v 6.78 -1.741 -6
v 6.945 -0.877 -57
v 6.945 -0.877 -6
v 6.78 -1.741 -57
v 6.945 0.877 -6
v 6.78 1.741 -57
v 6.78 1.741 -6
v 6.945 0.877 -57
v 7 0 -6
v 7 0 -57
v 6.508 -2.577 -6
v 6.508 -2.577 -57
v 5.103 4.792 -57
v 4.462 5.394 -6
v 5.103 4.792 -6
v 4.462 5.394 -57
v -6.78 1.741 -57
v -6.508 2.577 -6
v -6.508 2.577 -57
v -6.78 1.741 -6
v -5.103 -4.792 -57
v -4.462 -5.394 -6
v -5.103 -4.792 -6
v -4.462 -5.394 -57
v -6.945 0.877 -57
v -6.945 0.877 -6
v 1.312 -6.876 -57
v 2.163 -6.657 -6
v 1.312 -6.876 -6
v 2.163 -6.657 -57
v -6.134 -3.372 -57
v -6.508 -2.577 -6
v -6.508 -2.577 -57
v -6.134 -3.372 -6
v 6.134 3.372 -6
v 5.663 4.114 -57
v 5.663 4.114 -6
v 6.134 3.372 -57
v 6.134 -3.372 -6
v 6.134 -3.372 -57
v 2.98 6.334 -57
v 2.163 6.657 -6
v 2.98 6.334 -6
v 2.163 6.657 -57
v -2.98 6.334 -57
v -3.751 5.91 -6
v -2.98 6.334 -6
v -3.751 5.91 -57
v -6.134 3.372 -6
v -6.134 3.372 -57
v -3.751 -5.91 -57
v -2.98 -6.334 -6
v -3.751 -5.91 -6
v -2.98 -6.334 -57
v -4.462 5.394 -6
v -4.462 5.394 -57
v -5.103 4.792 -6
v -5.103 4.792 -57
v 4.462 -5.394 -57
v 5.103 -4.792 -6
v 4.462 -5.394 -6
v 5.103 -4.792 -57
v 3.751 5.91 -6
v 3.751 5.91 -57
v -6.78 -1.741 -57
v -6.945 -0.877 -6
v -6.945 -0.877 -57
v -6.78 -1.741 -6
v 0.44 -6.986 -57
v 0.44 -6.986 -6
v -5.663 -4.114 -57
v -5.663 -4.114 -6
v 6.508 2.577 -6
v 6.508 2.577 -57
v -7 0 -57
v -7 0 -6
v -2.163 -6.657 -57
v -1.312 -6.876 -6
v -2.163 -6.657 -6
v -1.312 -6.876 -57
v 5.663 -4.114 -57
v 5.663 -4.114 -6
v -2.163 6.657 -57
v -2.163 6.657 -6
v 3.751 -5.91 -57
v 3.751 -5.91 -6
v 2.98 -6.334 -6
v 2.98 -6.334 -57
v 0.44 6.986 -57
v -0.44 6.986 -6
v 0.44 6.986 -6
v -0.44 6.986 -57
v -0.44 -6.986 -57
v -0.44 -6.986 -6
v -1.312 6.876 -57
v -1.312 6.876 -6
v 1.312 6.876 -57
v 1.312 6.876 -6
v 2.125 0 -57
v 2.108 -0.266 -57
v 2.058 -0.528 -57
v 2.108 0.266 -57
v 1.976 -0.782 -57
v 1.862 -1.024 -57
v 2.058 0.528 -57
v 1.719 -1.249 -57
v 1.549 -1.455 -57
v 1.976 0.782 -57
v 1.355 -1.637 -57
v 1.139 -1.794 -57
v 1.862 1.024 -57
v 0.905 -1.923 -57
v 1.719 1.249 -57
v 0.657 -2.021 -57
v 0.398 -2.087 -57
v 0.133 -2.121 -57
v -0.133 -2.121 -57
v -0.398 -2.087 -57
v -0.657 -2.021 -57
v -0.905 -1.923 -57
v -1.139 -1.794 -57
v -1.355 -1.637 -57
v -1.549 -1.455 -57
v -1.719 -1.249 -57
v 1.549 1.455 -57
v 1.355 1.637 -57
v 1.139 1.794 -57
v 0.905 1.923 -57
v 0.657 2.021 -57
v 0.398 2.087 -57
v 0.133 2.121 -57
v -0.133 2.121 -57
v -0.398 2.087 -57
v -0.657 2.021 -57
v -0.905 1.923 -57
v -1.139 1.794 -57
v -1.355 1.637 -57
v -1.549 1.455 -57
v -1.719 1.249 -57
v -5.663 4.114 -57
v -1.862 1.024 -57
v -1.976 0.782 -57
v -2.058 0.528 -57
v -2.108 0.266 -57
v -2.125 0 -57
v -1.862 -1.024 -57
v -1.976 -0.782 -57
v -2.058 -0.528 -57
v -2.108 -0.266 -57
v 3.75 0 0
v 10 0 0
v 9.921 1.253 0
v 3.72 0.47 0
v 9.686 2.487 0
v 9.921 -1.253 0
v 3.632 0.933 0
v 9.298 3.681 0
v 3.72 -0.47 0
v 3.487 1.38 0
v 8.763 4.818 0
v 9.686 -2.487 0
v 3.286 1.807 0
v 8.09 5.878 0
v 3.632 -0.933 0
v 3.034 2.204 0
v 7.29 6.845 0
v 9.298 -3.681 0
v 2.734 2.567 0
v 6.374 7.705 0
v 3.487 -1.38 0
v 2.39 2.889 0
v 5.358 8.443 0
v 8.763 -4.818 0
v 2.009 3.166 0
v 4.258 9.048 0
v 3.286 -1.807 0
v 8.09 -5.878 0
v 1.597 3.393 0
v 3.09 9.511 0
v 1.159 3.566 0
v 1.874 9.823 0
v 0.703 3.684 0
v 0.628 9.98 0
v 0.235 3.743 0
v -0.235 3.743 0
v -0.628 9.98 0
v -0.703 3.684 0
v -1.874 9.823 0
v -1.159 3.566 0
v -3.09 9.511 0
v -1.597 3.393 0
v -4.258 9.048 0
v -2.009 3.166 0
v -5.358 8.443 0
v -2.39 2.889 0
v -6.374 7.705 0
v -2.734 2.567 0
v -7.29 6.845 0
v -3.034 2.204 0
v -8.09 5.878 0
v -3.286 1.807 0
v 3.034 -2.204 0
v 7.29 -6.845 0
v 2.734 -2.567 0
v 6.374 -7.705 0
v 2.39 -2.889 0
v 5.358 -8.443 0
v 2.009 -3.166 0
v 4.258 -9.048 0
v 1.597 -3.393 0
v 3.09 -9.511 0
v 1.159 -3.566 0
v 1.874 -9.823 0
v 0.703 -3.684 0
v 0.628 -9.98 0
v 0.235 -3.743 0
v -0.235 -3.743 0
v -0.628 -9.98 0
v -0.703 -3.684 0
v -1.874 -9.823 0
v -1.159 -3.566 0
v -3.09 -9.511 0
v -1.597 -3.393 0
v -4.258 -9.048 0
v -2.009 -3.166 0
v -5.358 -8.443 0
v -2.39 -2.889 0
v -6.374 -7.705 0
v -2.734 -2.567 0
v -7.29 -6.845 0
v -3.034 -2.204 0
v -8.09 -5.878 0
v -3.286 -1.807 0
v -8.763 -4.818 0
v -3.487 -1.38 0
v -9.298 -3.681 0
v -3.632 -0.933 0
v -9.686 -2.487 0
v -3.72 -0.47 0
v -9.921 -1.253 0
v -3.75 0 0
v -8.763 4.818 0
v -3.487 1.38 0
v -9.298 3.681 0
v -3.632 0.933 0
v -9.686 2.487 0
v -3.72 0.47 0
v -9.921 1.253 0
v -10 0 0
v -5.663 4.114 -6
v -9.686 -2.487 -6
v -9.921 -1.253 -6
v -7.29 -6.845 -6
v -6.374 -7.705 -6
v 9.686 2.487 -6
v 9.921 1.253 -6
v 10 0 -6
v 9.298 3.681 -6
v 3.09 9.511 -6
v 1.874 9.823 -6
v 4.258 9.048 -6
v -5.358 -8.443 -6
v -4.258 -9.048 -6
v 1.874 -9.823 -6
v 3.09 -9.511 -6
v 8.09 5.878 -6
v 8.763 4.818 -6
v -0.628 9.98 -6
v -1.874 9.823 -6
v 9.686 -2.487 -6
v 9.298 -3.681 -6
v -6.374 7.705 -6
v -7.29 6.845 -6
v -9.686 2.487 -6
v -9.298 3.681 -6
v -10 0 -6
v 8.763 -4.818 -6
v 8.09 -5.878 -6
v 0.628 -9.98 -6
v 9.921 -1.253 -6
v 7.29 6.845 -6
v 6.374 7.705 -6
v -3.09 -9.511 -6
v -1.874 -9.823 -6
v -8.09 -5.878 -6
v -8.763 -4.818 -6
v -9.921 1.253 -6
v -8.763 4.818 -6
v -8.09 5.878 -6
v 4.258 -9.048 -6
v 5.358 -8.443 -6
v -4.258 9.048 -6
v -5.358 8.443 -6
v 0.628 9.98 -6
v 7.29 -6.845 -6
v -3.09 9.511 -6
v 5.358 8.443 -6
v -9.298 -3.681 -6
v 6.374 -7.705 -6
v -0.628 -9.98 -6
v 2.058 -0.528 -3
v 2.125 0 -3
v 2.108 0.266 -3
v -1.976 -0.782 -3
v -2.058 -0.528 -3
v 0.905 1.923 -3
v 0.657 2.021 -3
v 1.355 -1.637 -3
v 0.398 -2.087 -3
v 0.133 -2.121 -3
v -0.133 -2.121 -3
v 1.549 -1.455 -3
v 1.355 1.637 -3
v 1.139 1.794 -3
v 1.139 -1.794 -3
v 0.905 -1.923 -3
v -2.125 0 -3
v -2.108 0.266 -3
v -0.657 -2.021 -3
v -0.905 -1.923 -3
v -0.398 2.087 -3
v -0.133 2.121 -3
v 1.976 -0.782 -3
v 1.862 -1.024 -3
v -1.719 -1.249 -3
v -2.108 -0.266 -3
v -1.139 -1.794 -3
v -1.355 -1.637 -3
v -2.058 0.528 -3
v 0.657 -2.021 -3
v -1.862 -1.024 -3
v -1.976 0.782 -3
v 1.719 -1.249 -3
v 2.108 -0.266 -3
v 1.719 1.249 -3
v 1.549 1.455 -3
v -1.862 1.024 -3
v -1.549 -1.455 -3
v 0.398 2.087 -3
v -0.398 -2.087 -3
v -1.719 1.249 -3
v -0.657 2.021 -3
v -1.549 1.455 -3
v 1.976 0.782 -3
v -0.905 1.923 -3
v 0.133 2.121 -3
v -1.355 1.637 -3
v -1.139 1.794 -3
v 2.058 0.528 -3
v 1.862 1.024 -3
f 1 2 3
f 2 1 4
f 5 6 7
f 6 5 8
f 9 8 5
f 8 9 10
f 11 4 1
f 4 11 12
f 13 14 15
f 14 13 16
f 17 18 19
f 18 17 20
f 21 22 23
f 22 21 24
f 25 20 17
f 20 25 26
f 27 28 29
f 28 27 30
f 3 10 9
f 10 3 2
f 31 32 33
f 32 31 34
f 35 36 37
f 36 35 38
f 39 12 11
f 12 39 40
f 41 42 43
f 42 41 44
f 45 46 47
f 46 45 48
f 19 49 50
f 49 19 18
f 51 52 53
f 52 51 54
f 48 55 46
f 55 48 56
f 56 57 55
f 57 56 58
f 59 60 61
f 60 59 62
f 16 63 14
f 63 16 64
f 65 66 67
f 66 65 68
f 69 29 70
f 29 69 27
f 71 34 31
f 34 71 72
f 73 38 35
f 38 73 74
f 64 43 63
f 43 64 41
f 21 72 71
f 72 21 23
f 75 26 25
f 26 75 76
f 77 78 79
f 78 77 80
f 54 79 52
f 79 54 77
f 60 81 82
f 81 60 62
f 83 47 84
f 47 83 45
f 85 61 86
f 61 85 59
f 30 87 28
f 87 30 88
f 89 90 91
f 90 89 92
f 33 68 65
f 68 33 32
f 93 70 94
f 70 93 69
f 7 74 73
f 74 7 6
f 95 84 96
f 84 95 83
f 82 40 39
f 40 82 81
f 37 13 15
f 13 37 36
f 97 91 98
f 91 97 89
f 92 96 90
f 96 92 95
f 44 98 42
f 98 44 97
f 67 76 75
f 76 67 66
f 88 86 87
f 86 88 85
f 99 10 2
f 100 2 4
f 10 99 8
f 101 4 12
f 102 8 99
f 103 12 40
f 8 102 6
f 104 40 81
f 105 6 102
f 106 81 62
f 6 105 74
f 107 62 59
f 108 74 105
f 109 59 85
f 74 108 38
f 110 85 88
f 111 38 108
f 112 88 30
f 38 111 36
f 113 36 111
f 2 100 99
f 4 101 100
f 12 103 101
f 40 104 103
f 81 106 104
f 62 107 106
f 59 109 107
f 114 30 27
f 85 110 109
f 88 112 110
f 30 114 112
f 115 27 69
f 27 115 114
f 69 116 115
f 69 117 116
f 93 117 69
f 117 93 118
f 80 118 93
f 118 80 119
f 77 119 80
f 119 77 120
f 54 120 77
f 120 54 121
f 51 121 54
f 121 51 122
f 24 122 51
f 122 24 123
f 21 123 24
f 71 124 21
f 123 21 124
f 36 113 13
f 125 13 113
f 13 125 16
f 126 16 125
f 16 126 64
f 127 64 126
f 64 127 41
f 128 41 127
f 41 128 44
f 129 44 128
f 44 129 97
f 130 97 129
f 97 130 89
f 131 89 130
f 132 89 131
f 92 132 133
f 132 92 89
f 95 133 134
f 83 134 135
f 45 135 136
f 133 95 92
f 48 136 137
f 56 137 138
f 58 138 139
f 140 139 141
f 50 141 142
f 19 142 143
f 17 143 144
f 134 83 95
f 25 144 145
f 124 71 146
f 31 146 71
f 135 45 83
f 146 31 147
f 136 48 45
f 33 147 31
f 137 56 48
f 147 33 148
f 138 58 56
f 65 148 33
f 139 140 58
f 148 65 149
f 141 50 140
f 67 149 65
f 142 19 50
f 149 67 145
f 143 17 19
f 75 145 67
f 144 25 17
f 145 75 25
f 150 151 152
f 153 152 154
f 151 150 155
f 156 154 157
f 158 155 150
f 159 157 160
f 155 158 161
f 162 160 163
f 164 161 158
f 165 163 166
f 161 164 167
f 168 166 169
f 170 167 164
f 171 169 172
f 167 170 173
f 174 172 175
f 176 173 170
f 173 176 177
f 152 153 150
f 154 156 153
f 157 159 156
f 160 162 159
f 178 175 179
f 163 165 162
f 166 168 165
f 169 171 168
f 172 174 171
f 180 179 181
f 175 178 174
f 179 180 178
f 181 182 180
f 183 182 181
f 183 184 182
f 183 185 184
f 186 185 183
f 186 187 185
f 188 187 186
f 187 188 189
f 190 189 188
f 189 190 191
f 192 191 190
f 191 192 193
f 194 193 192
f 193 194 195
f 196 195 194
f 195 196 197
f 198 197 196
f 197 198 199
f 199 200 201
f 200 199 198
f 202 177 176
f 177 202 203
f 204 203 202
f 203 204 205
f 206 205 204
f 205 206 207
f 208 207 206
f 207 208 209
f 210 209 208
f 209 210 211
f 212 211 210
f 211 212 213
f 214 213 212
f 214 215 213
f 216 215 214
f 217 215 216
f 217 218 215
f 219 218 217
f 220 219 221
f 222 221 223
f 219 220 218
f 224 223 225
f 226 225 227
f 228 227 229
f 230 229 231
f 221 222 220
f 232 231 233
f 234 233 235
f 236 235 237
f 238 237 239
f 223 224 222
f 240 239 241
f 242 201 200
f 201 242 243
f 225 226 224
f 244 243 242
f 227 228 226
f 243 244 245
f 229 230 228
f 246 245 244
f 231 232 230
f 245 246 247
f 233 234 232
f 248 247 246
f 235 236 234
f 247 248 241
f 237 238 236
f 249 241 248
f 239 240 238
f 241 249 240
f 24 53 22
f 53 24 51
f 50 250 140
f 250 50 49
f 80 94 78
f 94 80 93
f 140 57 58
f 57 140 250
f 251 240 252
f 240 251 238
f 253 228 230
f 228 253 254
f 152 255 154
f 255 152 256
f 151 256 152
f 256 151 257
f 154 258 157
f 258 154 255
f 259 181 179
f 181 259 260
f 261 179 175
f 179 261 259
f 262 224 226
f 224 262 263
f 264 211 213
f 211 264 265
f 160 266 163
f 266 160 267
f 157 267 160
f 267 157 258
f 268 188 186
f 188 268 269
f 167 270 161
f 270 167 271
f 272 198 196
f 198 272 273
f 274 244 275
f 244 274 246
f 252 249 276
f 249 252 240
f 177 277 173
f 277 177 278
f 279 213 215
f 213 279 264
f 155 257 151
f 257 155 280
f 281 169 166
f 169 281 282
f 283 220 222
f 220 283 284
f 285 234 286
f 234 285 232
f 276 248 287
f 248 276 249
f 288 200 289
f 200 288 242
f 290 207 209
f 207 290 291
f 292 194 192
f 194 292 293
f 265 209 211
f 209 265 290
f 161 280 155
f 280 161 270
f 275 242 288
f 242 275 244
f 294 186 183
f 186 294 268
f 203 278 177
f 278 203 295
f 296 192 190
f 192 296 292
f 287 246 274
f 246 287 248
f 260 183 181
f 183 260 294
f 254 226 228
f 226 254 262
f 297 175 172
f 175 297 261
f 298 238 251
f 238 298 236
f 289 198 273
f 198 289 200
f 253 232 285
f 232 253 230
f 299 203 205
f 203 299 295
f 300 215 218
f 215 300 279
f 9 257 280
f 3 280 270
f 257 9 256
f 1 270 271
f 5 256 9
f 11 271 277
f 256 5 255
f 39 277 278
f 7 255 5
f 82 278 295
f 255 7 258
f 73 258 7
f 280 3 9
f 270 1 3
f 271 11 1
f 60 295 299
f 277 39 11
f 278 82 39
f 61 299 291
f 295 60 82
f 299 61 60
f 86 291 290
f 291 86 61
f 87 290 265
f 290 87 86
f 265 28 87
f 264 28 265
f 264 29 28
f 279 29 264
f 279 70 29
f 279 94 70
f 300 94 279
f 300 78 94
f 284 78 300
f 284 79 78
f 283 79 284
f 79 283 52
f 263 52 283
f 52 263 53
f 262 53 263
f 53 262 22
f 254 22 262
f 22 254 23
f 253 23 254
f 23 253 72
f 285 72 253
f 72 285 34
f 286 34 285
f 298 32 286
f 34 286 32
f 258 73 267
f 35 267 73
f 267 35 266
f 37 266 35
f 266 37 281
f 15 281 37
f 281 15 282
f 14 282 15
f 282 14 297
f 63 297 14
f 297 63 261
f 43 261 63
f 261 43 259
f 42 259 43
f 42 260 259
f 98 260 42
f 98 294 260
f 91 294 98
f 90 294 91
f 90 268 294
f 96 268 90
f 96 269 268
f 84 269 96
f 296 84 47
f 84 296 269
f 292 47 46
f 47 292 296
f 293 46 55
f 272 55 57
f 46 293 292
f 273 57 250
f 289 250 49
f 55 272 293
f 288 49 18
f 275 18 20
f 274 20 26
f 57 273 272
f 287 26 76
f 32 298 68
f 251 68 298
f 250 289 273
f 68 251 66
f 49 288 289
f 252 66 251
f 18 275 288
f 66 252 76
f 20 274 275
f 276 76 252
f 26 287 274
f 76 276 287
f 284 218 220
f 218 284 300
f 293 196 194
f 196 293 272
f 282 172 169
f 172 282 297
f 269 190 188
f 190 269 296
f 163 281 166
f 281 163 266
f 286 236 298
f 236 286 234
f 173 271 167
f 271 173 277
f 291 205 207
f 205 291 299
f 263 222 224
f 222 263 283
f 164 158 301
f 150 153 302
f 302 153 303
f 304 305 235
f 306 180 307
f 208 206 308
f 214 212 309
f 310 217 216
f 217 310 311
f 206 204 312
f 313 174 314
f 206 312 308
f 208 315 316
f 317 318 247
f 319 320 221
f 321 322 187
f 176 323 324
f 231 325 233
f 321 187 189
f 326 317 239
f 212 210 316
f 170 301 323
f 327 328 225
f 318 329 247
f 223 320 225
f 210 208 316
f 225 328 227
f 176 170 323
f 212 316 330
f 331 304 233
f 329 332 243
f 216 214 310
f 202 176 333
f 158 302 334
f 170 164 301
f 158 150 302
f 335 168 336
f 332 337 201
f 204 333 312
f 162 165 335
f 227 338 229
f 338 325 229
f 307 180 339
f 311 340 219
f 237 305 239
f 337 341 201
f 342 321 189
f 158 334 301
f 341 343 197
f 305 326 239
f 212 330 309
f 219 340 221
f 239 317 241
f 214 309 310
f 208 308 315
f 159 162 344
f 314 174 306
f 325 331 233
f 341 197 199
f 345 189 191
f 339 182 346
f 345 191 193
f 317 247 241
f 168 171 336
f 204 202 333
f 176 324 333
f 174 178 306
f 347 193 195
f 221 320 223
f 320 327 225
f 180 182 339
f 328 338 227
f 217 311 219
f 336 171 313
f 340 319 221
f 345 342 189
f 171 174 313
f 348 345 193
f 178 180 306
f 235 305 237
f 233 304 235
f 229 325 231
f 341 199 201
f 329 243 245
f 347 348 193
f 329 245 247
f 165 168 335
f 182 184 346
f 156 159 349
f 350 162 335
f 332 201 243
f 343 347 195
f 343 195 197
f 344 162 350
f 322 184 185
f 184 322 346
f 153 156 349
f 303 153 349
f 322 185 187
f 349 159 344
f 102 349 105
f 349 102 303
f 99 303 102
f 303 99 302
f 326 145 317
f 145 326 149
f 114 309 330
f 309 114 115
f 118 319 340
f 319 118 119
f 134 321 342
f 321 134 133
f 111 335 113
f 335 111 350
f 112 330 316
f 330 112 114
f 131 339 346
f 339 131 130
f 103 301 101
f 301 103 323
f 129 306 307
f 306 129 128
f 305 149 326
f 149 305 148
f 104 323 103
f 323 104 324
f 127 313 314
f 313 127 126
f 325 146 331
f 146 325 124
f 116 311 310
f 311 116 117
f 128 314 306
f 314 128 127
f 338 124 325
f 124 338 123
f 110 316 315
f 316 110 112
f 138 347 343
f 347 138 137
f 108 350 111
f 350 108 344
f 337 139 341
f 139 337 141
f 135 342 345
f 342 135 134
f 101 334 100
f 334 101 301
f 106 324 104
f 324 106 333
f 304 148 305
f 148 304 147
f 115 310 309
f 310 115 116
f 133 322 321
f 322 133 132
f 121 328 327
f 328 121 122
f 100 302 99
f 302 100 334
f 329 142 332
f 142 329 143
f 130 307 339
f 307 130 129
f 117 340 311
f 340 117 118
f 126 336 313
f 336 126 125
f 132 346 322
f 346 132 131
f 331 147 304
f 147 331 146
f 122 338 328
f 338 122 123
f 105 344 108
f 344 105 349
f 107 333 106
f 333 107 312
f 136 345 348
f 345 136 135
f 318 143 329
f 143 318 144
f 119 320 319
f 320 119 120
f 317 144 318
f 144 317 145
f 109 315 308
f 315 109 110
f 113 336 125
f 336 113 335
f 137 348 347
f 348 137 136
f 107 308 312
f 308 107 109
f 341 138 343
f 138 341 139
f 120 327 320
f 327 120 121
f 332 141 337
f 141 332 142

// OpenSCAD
$fn = 50;


difference() {
	union() {
		translate(v = [0, 0, -57.0000000000]) {
			cylinder(h = 57, r = 7.0000000000);
		}
		translate(v = [0, 0, -6.0000000000]) {
			cylinder(h = 6, r = 10.0000000000);
		}
	}
	union() {
		translate(v = [0, 0, 0]) {
			rotate(a = [0, 0, 0]) {
				difference() {
					union() {
						#translate(v = [0, 0, -57.0000000000]) {
							cylinder(h = 57, r = 2.0000000000);
						}
						#translate(v = [0, 0, -3]) {
							cylinder(h = 3, r1 = 2.1250000000, r2 = 3.7500000000);
						}
						#translate(v = [0, 0, -57.0000000000]) {
							cylinder(h = 57, r = 2.1250000000);
						}
						#translate(v = [0, 0, -57.0000000000]) {
							cylinder(h = 57, r = 2.0000000000);
						}
					}
					union();
				}
			}
		}
	}
}
